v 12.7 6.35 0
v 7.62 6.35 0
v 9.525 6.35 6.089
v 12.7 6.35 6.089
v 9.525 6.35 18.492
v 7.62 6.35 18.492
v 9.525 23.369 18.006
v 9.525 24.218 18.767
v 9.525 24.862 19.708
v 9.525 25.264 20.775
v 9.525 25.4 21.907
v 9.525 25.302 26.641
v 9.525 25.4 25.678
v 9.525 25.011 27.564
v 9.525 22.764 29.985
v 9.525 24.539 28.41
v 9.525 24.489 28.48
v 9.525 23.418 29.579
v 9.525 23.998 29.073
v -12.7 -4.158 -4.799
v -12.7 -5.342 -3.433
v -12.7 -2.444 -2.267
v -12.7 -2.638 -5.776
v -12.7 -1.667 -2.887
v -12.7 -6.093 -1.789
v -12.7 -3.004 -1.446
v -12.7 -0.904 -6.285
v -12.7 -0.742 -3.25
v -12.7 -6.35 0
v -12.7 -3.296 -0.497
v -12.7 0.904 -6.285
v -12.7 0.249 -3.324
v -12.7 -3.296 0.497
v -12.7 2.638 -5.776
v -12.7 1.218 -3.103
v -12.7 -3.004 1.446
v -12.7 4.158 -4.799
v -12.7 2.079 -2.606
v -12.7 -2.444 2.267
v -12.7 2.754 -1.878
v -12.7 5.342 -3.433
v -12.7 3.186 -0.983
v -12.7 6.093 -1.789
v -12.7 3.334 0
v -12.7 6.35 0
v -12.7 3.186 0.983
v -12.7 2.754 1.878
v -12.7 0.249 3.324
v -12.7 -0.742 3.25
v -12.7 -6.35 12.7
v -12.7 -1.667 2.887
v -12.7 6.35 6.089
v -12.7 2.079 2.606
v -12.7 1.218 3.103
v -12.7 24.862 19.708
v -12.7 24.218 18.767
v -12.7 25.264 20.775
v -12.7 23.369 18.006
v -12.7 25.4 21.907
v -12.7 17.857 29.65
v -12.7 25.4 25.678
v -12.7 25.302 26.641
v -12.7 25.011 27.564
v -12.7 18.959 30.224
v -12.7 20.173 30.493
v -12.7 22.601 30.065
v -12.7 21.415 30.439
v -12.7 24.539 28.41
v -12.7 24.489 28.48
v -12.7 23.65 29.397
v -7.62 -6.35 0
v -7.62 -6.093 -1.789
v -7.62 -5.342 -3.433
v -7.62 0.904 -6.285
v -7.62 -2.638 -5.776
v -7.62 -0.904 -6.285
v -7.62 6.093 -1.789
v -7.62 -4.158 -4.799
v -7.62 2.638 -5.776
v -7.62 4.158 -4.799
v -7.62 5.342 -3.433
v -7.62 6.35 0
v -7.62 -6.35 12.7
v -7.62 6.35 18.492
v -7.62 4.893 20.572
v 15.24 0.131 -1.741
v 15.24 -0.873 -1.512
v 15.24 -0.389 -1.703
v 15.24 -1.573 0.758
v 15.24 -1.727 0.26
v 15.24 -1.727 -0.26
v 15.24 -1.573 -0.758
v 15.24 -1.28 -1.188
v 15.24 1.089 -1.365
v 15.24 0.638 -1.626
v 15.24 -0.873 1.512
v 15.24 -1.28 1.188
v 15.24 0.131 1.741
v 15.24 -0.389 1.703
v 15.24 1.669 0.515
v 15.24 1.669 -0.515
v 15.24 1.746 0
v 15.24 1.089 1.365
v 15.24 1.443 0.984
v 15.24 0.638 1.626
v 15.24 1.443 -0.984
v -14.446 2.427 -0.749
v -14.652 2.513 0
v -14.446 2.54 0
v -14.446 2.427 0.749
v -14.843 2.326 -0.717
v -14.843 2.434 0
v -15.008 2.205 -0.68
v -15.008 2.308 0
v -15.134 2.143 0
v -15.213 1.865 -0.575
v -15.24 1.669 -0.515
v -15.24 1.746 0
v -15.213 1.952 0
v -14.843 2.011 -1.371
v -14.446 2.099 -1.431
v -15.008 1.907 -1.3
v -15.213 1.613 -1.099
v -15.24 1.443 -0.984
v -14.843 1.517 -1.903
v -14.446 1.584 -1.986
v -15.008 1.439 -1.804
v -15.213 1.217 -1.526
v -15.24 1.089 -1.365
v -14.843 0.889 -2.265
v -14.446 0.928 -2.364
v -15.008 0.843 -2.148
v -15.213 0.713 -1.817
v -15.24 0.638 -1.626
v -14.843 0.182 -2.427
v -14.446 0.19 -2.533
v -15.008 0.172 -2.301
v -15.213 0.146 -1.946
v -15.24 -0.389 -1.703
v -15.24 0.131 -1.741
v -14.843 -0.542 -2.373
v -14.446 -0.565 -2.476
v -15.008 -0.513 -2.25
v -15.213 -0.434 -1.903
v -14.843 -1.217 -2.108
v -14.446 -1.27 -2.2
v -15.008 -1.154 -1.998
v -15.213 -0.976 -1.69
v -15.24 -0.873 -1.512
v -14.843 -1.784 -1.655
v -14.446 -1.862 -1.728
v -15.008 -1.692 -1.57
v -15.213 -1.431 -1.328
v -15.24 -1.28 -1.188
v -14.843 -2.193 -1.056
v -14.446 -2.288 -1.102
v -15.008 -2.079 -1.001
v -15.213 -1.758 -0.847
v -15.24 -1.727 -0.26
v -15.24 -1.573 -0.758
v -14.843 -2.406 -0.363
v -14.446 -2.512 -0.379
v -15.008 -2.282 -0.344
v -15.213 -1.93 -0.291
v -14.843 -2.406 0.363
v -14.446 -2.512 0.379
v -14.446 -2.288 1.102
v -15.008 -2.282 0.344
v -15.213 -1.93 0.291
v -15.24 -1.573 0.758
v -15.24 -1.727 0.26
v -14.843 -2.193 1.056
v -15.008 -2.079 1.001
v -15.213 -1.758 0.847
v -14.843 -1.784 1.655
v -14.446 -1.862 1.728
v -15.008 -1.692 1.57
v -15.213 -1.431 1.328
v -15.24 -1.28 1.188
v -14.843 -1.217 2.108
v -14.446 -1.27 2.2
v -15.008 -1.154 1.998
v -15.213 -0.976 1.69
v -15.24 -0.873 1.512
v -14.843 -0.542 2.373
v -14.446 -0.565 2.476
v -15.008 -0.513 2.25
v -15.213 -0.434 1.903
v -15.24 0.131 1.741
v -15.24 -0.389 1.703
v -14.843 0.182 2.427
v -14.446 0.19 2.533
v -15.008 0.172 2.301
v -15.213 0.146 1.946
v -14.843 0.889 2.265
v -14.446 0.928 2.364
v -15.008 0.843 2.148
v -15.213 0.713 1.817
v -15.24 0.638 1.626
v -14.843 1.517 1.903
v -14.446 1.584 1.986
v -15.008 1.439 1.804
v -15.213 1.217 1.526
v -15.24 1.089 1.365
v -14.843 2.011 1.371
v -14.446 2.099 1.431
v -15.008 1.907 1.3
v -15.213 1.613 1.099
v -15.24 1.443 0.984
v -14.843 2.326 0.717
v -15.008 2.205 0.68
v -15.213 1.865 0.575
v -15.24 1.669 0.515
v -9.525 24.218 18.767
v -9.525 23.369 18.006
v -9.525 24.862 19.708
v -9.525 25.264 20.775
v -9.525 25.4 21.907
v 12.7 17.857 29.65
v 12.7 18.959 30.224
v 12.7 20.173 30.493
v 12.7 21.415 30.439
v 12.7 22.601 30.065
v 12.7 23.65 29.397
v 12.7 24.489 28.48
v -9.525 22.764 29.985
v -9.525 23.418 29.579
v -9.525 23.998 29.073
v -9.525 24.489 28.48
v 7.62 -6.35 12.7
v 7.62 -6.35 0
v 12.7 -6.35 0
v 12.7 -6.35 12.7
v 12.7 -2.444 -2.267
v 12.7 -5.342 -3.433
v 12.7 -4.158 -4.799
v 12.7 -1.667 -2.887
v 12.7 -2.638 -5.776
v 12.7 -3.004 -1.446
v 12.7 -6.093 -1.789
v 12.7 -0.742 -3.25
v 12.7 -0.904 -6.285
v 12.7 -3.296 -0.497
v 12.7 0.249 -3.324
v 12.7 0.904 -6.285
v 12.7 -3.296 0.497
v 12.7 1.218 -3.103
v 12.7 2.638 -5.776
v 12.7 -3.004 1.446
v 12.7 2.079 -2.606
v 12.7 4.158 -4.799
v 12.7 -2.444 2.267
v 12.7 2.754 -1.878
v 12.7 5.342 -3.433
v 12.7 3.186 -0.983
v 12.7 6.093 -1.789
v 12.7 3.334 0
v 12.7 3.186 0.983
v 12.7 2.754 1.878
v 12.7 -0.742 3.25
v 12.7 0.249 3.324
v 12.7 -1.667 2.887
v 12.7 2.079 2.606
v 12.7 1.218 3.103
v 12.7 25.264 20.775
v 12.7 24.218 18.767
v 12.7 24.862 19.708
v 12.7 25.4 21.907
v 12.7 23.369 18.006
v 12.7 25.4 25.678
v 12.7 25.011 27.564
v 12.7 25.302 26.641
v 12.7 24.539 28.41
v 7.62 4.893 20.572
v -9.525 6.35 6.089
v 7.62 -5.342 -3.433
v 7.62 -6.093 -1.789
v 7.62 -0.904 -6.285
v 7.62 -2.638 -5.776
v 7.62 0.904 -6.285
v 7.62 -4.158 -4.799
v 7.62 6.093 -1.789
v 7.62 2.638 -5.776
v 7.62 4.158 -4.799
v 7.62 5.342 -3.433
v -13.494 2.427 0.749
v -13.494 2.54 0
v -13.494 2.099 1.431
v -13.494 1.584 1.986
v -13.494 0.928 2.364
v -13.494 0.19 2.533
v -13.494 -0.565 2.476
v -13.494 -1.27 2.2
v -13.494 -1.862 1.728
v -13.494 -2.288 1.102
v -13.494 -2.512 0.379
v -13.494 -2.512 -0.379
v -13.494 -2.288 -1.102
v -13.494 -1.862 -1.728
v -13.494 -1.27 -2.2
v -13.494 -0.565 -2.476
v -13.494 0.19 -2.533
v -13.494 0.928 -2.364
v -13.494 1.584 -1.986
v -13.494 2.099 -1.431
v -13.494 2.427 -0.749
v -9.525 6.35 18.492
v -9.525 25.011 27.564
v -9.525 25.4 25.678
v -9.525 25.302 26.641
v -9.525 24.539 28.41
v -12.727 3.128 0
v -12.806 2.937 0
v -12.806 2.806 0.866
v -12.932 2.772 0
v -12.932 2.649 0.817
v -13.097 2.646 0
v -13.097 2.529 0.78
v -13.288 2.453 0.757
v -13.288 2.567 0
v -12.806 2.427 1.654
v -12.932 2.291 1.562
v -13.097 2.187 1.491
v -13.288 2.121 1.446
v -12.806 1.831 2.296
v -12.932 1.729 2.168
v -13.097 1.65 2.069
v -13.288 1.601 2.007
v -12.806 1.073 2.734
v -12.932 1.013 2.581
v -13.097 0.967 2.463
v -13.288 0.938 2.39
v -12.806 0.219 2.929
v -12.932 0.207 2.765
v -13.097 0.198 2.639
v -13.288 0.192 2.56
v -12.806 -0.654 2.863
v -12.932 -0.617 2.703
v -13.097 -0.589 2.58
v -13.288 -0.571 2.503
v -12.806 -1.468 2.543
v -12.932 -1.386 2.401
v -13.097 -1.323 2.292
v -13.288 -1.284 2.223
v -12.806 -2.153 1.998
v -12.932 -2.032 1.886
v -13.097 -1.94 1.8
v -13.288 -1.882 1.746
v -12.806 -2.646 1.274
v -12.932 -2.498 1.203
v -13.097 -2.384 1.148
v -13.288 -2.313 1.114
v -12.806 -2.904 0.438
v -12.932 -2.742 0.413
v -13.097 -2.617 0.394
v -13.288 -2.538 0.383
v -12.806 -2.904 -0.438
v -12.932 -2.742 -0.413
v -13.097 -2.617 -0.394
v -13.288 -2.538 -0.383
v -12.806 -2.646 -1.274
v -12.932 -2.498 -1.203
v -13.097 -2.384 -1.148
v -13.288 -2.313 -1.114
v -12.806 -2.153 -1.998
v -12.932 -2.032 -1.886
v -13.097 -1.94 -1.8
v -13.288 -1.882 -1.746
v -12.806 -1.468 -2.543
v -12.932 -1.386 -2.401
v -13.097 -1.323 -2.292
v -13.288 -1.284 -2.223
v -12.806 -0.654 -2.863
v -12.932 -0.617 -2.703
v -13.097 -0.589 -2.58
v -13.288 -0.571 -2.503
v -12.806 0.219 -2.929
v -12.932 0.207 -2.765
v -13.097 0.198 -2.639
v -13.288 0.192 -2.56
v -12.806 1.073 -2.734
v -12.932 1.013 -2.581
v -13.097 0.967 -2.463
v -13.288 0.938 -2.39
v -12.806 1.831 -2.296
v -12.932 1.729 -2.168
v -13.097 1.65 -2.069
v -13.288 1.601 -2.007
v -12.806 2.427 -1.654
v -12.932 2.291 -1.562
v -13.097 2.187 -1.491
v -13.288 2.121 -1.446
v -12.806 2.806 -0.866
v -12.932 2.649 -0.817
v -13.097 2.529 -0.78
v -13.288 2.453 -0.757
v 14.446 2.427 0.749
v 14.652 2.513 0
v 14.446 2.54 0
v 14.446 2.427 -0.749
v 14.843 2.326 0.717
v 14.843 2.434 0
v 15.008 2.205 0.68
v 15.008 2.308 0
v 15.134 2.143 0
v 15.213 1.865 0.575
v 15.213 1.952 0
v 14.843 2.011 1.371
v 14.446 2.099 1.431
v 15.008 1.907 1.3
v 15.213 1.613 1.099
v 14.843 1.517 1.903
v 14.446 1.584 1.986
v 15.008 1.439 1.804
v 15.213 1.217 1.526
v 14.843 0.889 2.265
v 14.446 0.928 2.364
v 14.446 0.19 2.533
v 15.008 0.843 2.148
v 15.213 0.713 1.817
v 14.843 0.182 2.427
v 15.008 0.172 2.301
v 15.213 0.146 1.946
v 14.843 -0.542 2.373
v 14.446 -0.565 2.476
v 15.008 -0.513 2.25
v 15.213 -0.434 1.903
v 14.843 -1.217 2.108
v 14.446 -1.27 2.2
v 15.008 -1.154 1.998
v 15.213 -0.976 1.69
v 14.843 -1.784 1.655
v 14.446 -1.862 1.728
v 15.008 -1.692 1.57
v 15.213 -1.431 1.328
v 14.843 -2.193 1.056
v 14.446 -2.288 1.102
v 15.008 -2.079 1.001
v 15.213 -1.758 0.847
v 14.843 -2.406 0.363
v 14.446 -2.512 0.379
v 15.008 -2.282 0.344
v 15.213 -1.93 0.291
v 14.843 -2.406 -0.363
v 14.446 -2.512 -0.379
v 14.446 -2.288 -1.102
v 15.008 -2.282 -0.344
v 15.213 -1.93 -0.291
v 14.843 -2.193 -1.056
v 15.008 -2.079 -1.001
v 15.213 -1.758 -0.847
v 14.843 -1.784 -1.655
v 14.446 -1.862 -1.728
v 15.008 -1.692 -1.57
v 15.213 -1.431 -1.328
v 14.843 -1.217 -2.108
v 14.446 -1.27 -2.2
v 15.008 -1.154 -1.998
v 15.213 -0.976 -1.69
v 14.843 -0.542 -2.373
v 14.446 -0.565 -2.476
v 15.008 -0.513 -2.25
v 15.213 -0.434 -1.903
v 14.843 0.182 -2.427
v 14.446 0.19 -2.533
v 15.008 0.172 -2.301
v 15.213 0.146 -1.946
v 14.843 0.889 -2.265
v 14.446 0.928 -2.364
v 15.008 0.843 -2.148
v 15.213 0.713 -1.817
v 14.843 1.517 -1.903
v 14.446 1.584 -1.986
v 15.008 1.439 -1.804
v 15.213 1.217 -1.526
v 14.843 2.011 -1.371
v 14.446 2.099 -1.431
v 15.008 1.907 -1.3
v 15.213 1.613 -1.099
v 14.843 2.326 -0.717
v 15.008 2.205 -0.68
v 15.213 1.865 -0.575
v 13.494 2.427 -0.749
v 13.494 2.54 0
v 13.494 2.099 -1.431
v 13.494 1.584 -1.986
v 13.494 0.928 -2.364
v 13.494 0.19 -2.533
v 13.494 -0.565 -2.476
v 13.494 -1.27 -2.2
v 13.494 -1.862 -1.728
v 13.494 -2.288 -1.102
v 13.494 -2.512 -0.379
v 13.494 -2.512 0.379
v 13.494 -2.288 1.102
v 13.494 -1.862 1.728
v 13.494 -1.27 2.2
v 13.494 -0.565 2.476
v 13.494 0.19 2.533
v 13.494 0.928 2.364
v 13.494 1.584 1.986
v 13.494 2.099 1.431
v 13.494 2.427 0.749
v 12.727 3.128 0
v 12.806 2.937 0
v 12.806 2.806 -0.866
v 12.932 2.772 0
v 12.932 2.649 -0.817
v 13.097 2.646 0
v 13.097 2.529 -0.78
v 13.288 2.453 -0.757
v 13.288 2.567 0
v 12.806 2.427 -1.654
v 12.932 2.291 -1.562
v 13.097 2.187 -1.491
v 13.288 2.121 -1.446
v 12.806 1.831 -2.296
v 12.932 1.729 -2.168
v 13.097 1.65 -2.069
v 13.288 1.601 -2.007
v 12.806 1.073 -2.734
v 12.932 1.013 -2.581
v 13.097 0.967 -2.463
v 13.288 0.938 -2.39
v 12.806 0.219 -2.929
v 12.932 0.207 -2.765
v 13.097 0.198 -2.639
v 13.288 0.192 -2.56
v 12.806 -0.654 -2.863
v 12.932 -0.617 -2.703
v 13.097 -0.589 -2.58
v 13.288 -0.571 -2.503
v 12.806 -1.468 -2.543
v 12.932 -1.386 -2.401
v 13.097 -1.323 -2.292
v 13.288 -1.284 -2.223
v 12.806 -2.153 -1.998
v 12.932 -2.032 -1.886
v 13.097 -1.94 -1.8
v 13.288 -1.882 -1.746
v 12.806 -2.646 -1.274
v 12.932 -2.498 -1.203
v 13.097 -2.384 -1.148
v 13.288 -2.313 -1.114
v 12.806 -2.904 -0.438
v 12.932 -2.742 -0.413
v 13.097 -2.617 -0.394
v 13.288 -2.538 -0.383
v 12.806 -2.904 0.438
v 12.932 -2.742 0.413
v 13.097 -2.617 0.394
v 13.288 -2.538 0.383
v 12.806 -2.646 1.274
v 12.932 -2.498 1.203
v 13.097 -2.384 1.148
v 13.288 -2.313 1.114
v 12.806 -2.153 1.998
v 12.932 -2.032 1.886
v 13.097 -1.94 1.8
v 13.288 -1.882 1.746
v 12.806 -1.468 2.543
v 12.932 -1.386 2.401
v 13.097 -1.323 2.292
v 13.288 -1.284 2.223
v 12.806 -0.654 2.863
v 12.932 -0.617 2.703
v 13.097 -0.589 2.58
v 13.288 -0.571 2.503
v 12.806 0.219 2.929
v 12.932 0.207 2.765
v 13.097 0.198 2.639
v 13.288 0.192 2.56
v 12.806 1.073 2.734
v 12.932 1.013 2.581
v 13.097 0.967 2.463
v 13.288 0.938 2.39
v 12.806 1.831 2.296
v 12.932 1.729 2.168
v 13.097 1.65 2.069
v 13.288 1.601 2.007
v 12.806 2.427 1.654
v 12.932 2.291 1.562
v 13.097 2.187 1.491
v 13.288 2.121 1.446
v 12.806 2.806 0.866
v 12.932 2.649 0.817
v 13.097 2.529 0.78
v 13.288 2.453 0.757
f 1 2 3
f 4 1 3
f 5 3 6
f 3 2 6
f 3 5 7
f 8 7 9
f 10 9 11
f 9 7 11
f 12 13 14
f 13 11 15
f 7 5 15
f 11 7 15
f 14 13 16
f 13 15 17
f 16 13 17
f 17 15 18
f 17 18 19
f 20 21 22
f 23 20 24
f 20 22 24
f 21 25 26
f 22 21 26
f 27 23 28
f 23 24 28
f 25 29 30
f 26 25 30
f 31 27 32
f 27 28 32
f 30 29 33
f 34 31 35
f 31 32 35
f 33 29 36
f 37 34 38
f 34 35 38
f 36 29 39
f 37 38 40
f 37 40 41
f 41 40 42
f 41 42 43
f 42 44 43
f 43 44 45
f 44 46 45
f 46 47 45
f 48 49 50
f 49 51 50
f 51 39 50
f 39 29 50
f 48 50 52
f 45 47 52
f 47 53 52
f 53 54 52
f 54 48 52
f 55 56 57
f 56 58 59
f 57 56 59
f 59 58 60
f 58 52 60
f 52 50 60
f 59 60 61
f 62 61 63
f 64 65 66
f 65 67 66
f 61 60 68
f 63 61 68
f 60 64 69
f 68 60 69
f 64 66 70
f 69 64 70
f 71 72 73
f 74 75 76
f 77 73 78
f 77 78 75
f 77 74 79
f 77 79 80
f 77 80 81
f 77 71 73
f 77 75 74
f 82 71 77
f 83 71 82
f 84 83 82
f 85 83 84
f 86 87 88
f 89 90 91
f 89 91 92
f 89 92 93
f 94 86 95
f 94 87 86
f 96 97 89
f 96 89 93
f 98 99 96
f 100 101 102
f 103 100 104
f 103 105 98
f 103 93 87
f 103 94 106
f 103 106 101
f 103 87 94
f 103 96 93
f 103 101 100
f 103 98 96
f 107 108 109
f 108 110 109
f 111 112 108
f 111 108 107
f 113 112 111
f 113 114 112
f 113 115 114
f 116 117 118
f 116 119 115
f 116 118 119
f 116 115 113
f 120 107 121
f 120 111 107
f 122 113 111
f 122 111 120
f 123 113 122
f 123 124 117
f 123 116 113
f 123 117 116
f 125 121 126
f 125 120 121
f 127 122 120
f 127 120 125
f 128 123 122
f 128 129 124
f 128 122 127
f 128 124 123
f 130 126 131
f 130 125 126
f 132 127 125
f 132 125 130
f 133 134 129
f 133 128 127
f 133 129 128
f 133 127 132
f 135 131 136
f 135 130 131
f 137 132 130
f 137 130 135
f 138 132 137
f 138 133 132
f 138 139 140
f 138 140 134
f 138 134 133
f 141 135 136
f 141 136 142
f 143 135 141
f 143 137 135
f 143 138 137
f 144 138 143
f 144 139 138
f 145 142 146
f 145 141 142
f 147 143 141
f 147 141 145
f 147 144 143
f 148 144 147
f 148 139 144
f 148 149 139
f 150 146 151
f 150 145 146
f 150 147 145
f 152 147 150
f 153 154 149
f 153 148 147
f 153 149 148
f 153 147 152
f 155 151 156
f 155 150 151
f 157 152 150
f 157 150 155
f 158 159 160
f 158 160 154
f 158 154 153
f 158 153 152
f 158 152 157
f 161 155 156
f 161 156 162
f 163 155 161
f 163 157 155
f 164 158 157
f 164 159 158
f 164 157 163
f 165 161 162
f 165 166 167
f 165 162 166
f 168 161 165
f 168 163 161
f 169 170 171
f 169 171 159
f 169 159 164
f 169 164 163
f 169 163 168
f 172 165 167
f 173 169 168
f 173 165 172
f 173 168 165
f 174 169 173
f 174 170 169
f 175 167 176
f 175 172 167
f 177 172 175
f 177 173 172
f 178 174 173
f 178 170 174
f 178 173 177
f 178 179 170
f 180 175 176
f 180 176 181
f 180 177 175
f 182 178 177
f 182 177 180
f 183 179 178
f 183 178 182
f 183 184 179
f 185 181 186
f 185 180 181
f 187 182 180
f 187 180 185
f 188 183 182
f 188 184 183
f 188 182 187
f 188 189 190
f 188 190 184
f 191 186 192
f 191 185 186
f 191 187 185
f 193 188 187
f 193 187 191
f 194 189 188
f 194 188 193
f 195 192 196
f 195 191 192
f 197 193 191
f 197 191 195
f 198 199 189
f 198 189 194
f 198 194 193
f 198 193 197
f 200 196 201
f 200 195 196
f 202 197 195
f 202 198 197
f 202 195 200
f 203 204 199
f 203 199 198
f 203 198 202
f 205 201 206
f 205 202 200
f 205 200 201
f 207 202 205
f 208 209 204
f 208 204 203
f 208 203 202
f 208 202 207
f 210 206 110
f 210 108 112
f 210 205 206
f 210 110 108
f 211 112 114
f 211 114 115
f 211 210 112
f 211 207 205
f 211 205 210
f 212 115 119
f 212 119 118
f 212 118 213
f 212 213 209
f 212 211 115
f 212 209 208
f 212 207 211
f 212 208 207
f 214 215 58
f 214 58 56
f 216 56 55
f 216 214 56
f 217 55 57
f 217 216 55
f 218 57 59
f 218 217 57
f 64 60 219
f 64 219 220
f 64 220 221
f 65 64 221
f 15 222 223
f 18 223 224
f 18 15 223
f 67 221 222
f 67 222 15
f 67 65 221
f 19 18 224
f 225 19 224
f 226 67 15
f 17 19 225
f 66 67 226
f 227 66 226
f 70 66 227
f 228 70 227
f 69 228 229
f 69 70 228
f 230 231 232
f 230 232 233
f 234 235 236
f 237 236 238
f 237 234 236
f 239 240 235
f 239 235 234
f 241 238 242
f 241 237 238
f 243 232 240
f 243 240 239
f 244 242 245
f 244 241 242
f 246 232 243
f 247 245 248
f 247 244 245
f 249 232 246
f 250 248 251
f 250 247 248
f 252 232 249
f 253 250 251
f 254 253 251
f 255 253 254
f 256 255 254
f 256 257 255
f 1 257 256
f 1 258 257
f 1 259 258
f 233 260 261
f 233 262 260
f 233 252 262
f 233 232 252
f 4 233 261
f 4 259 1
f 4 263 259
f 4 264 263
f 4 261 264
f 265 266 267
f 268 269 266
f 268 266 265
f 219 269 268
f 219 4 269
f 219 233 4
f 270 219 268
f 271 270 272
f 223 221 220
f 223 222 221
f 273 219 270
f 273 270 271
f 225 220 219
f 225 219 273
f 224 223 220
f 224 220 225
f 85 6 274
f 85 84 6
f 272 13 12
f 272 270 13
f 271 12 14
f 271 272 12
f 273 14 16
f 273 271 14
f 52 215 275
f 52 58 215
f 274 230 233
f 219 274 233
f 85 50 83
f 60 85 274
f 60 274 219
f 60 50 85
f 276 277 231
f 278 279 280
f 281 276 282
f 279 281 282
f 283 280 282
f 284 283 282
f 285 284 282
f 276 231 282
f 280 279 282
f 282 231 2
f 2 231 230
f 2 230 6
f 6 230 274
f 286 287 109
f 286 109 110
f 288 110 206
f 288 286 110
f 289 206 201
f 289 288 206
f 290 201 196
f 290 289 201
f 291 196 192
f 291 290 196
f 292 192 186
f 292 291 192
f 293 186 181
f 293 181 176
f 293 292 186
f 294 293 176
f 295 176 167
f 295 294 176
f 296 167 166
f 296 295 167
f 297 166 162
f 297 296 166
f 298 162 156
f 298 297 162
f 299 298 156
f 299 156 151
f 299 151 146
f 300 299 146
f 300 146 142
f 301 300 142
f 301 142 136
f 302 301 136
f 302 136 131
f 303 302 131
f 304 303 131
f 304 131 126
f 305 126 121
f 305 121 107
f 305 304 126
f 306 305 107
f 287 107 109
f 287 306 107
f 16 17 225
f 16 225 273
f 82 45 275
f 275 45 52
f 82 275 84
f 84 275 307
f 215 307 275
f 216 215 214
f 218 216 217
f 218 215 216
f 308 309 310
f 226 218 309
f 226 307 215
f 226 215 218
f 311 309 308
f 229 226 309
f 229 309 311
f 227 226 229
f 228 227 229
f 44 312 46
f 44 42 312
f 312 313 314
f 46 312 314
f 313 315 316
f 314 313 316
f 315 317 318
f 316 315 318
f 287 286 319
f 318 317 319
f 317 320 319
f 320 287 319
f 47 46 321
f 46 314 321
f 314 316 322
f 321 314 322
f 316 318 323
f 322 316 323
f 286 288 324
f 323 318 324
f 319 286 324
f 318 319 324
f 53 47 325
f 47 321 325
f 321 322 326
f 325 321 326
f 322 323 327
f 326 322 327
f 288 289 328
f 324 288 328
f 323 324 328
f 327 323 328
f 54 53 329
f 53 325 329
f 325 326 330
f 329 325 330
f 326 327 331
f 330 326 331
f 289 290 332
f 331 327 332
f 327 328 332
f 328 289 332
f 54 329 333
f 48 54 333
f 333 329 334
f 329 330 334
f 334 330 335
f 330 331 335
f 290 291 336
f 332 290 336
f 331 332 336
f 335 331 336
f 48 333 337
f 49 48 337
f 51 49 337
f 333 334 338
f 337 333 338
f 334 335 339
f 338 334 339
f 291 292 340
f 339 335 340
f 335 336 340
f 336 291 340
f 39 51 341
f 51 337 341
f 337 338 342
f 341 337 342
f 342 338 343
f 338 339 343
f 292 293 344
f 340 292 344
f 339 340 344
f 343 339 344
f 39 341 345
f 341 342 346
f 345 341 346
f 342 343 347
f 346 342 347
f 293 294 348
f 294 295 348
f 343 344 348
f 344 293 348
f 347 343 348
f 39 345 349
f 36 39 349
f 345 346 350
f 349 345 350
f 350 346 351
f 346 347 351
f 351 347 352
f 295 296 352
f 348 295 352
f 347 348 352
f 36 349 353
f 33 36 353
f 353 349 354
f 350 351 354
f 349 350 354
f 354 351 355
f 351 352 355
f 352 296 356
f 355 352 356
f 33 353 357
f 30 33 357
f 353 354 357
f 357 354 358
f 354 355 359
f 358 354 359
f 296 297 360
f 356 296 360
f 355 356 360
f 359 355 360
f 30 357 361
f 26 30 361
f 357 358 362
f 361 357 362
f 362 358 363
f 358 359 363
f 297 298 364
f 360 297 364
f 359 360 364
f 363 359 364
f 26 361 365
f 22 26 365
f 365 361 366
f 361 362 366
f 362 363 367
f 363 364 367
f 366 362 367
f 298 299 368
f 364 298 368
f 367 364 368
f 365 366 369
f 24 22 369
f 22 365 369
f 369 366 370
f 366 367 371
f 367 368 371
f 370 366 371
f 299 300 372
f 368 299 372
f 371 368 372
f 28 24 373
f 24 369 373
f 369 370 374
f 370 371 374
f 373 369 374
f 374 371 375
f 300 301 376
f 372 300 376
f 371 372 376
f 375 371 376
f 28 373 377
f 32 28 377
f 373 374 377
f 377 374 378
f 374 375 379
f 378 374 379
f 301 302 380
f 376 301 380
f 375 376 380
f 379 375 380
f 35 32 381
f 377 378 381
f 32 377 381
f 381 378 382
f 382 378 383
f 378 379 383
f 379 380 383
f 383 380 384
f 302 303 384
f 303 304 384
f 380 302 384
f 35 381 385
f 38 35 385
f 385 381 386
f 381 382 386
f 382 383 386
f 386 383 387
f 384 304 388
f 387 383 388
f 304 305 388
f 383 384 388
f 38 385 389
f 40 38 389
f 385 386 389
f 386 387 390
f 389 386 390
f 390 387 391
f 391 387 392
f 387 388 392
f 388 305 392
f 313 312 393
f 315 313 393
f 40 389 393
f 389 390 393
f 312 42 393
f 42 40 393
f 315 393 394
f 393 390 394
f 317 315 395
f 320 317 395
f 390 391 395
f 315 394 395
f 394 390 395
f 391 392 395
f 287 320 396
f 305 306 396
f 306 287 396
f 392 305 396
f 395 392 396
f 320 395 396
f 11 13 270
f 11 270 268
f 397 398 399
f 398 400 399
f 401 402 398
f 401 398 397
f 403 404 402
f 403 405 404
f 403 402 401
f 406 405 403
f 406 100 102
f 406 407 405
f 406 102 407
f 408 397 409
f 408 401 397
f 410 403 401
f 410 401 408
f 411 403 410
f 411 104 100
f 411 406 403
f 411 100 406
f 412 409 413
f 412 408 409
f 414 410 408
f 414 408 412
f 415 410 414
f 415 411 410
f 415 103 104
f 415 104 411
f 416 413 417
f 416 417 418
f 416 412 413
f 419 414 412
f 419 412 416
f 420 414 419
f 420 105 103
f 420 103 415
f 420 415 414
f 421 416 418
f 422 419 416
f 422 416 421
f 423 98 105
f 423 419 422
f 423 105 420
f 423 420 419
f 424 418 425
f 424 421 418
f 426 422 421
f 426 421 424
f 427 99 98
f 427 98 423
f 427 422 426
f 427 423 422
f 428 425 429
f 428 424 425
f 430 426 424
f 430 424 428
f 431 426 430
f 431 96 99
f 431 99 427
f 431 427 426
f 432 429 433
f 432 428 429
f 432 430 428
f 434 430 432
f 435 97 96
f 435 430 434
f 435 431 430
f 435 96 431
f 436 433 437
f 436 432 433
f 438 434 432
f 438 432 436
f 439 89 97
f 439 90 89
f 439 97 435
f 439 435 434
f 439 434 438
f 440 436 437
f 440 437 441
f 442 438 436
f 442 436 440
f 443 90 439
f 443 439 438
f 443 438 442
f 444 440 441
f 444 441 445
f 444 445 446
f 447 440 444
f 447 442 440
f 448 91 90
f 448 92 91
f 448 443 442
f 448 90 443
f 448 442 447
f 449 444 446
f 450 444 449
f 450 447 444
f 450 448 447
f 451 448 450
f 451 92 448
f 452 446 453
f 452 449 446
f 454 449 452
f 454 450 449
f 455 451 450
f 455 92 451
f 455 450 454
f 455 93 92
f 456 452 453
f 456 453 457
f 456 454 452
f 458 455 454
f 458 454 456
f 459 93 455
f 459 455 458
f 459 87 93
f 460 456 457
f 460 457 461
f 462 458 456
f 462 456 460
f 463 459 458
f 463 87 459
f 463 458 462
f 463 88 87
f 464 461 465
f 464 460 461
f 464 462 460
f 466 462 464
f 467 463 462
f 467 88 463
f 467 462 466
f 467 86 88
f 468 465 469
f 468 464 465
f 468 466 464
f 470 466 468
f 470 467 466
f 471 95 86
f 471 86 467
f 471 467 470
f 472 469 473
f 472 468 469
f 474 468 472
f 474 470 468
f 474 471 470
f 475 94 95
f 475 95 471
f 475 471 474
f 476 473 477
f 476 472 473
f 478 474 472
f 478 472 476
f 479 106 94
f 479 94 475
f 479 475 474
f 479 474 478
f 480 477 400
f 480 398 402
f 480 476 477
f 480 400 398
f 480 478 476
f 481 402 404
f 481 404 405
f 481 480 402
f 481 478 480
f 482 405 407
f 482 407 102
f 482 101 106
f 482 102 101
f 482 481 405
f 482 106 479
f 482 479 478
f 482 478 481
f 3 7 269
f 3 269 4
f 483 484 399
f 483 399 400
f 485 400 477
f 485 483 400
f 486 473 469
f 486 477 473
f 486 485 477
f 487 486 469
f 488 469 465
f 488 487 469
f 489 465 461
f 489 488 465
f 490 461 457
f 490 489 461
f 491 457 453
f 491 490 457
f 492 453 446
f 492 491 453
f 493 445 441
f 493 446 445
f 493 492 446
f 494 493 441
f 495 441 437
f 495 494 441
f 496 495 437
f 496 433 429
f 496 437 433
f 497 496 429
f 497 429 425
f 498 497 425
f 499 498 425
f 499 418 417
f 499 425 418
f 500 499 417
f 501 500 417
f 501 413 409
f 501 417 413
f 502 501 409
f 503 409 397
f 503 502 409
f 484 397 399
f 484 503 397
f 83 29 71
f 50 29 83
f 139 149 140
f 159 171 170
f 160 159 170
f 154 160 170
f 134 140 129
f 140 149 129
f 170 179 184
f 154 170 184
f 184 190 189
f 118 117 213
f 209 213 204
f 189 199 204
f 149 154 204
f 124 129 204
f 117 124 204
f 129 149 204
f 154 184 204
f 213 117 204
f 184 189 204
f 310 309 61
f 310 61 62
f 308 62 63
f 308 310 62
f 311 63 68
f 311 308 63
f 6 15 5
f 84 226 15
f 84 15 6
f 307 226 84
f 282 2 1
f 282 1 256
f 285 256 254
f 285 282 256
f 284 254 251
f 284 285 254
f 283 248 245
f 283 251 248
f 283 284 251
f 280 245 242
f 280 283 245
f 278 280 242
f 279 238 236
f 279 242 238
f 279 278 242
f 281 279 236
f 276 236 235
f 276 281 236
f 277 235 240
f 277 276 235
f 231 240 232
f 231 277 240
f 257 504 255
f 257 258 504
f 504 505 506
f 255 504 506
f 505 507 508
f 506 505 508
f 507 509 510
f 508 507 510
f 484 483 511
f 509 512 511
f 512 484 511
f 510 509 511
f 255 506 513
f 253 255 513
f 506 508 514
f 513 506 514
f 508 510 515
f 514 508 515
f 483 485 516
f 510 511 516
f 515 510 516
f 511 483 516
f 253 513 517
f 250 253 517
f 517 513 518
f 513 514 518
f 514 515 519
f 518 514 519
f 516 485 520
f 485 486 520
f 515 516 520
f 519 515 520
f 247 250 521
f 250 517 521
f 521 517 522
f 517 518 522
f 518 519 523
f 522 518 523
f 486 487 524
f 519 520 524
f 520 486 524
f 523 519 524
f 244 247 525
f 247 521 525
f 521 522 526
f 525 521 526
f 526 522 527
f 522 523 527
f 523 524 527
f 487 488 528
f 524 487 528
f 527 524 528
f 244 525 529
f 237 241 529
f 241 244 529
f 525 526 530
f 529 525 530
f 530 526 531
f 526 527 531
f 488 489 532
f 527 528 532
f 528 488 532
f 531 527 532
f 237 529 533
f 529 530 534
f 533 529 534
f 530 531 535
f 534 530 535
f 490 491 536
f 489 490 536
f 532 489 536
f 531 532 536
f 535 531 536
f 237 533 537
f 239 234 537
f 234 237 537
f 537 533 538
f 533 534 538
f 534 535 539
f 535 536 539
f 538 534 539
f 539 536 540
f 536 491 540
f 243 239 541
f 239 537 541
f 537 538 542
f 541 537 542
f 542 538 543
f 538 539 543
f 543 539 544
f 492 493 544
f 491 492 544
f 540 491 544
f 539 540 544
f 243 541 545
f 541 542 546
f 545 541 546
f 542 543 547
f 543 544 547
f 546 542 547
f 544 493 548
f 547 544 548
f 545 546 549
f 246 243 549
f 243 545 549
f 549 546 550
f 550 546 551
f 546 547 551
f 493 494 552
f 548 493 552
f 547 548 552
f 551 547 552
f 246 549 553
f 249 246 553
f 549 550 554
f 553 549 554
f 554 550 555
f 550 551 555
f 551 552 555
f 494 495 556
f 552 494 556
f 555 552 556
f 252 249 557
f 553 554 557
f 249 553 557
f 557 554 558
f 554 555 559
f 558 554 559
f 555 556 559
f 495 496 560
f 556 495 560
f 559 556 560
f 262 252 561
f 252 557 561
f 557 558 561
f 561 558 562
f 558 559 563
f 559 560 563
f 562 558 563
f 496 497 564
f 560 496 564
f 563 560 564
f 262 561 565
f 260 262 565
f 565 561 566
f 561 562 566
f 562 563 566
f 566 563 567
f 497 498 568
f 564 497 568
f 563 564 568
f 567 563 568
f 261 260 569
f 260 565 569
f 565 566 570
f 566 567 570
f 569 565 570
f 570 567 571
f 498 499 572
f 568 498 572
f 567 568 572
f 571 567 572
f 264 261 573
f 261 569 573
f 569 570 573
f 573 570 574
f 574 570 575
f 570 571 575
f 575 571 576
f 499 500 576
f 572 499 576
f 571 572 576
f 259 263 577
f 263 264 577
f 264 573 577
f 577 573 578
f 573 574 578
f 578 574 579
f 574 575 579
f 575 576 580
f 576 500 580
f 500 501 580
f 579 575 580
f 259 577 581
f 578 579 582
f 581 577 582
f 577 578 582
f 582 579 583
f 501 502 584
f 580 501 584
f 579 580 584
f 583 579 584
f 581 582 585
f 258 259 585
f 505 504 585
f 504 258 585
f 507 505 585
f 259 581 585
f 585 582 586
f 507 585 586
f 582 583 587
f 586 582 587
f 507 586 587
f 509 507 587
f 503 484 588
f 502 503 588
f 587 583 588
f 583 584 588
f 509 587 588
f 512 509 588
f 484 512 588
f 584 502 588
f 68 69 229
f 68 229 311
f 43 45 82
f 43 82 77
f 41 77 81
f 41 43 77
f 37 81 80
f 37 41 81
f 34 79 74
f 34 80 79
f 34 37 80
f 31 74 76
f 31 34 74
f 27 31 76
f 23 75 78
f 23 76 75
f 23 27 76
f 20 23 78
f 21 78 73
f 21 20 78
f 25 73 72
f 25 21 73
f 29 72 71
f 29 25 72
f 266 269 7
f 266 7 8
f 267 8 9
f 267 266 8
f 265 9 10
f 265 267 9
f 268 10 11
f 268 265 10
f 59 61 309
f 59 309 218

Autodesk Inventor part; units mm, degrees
ref_plane "YZ Plane" through (0, 0, 0) normal (1, 0, 0) x (0, 1, 0)
ref_plane "XZ Plane" through (0, 0, 0) normal (0, 1, 0) x (-1, 0, 0)
ref_plane "XY Plane" through (0, 0, 0) normal (0, 0, 1) x (1, 0, 0)
sketch "Sketch1" plane through (0, 0, 0) normal (1, 0, 0) x (0, 1, 0)
  circle A0 centre (0, 0) radius 2.54
  circle A1 centre (0, 0) radius 6.35
  line L0 (-6.35, 0) -> (-6.35, 12.7)
  line L1 (-6.35, 12.7) -> (21.7578, 32.3813)
  line L2 (21.7578, 32.3813) -> (25.4, 27.1797)
  line L3 (25.4, 27.1797) -> (25.4, 19.4278)
  line L4 (25.4, 19.4278) -> (6.35, 6.0888)
  line L5 (6.35, 0) -> (6.35, 6.0888)
  line L6 (23.2147, 30.3006) -> (-6.35, 9.5992)
  line L7 (6.35, 0) -> (6.35, 18.4919)
  line L8 (6.35, 18.4919) -> (4.8931, 20.5725)
  dimension "d0" = 5.08
  dimension "d1" = 12.7
  dimension "d2" = 12.7
  dimension "d3" = 145
  dimension "d5" = 125
  dimension "d6" = 31.75
  dimension "d7" = 12.7
  dimension "d8" = 6.35
  dimension "d15" = 2.54
extrude "Extrusion1" add sketch "Sketch1" along normal mid plane 25.4
extrude "Extrusion2" add sketch "Sketch1" along normal mid plane 30.48 contours A0
fillet "Fillet1" radius 4.7625 3 edges at (0, 25.4, 27.1797) (0, 21.7578, 32.3813) (0, 25.4, 19.4278)
fillet "Fillet2" radius 0.7937 4 edges at (15.24, -2.54, 0) (12.7, -2.54, 0) (-15.24, -2.54, 0) (-12.7, -2.54, 0)
extrude "Extrusion3" cut sketch "Sketch1" along normal mid plane 19.05 contours L7 L6 L2 L3 L4
extrude "Extrusion4" cut sketch "Sketch1" along normal mid plane 15.24 contours A0 | A1 | A1 L0 L6 L7 L5 | L0 L1 L8 L6
equation "\"d8\" = 0.5 * d7"
properties part number "LegV3"
